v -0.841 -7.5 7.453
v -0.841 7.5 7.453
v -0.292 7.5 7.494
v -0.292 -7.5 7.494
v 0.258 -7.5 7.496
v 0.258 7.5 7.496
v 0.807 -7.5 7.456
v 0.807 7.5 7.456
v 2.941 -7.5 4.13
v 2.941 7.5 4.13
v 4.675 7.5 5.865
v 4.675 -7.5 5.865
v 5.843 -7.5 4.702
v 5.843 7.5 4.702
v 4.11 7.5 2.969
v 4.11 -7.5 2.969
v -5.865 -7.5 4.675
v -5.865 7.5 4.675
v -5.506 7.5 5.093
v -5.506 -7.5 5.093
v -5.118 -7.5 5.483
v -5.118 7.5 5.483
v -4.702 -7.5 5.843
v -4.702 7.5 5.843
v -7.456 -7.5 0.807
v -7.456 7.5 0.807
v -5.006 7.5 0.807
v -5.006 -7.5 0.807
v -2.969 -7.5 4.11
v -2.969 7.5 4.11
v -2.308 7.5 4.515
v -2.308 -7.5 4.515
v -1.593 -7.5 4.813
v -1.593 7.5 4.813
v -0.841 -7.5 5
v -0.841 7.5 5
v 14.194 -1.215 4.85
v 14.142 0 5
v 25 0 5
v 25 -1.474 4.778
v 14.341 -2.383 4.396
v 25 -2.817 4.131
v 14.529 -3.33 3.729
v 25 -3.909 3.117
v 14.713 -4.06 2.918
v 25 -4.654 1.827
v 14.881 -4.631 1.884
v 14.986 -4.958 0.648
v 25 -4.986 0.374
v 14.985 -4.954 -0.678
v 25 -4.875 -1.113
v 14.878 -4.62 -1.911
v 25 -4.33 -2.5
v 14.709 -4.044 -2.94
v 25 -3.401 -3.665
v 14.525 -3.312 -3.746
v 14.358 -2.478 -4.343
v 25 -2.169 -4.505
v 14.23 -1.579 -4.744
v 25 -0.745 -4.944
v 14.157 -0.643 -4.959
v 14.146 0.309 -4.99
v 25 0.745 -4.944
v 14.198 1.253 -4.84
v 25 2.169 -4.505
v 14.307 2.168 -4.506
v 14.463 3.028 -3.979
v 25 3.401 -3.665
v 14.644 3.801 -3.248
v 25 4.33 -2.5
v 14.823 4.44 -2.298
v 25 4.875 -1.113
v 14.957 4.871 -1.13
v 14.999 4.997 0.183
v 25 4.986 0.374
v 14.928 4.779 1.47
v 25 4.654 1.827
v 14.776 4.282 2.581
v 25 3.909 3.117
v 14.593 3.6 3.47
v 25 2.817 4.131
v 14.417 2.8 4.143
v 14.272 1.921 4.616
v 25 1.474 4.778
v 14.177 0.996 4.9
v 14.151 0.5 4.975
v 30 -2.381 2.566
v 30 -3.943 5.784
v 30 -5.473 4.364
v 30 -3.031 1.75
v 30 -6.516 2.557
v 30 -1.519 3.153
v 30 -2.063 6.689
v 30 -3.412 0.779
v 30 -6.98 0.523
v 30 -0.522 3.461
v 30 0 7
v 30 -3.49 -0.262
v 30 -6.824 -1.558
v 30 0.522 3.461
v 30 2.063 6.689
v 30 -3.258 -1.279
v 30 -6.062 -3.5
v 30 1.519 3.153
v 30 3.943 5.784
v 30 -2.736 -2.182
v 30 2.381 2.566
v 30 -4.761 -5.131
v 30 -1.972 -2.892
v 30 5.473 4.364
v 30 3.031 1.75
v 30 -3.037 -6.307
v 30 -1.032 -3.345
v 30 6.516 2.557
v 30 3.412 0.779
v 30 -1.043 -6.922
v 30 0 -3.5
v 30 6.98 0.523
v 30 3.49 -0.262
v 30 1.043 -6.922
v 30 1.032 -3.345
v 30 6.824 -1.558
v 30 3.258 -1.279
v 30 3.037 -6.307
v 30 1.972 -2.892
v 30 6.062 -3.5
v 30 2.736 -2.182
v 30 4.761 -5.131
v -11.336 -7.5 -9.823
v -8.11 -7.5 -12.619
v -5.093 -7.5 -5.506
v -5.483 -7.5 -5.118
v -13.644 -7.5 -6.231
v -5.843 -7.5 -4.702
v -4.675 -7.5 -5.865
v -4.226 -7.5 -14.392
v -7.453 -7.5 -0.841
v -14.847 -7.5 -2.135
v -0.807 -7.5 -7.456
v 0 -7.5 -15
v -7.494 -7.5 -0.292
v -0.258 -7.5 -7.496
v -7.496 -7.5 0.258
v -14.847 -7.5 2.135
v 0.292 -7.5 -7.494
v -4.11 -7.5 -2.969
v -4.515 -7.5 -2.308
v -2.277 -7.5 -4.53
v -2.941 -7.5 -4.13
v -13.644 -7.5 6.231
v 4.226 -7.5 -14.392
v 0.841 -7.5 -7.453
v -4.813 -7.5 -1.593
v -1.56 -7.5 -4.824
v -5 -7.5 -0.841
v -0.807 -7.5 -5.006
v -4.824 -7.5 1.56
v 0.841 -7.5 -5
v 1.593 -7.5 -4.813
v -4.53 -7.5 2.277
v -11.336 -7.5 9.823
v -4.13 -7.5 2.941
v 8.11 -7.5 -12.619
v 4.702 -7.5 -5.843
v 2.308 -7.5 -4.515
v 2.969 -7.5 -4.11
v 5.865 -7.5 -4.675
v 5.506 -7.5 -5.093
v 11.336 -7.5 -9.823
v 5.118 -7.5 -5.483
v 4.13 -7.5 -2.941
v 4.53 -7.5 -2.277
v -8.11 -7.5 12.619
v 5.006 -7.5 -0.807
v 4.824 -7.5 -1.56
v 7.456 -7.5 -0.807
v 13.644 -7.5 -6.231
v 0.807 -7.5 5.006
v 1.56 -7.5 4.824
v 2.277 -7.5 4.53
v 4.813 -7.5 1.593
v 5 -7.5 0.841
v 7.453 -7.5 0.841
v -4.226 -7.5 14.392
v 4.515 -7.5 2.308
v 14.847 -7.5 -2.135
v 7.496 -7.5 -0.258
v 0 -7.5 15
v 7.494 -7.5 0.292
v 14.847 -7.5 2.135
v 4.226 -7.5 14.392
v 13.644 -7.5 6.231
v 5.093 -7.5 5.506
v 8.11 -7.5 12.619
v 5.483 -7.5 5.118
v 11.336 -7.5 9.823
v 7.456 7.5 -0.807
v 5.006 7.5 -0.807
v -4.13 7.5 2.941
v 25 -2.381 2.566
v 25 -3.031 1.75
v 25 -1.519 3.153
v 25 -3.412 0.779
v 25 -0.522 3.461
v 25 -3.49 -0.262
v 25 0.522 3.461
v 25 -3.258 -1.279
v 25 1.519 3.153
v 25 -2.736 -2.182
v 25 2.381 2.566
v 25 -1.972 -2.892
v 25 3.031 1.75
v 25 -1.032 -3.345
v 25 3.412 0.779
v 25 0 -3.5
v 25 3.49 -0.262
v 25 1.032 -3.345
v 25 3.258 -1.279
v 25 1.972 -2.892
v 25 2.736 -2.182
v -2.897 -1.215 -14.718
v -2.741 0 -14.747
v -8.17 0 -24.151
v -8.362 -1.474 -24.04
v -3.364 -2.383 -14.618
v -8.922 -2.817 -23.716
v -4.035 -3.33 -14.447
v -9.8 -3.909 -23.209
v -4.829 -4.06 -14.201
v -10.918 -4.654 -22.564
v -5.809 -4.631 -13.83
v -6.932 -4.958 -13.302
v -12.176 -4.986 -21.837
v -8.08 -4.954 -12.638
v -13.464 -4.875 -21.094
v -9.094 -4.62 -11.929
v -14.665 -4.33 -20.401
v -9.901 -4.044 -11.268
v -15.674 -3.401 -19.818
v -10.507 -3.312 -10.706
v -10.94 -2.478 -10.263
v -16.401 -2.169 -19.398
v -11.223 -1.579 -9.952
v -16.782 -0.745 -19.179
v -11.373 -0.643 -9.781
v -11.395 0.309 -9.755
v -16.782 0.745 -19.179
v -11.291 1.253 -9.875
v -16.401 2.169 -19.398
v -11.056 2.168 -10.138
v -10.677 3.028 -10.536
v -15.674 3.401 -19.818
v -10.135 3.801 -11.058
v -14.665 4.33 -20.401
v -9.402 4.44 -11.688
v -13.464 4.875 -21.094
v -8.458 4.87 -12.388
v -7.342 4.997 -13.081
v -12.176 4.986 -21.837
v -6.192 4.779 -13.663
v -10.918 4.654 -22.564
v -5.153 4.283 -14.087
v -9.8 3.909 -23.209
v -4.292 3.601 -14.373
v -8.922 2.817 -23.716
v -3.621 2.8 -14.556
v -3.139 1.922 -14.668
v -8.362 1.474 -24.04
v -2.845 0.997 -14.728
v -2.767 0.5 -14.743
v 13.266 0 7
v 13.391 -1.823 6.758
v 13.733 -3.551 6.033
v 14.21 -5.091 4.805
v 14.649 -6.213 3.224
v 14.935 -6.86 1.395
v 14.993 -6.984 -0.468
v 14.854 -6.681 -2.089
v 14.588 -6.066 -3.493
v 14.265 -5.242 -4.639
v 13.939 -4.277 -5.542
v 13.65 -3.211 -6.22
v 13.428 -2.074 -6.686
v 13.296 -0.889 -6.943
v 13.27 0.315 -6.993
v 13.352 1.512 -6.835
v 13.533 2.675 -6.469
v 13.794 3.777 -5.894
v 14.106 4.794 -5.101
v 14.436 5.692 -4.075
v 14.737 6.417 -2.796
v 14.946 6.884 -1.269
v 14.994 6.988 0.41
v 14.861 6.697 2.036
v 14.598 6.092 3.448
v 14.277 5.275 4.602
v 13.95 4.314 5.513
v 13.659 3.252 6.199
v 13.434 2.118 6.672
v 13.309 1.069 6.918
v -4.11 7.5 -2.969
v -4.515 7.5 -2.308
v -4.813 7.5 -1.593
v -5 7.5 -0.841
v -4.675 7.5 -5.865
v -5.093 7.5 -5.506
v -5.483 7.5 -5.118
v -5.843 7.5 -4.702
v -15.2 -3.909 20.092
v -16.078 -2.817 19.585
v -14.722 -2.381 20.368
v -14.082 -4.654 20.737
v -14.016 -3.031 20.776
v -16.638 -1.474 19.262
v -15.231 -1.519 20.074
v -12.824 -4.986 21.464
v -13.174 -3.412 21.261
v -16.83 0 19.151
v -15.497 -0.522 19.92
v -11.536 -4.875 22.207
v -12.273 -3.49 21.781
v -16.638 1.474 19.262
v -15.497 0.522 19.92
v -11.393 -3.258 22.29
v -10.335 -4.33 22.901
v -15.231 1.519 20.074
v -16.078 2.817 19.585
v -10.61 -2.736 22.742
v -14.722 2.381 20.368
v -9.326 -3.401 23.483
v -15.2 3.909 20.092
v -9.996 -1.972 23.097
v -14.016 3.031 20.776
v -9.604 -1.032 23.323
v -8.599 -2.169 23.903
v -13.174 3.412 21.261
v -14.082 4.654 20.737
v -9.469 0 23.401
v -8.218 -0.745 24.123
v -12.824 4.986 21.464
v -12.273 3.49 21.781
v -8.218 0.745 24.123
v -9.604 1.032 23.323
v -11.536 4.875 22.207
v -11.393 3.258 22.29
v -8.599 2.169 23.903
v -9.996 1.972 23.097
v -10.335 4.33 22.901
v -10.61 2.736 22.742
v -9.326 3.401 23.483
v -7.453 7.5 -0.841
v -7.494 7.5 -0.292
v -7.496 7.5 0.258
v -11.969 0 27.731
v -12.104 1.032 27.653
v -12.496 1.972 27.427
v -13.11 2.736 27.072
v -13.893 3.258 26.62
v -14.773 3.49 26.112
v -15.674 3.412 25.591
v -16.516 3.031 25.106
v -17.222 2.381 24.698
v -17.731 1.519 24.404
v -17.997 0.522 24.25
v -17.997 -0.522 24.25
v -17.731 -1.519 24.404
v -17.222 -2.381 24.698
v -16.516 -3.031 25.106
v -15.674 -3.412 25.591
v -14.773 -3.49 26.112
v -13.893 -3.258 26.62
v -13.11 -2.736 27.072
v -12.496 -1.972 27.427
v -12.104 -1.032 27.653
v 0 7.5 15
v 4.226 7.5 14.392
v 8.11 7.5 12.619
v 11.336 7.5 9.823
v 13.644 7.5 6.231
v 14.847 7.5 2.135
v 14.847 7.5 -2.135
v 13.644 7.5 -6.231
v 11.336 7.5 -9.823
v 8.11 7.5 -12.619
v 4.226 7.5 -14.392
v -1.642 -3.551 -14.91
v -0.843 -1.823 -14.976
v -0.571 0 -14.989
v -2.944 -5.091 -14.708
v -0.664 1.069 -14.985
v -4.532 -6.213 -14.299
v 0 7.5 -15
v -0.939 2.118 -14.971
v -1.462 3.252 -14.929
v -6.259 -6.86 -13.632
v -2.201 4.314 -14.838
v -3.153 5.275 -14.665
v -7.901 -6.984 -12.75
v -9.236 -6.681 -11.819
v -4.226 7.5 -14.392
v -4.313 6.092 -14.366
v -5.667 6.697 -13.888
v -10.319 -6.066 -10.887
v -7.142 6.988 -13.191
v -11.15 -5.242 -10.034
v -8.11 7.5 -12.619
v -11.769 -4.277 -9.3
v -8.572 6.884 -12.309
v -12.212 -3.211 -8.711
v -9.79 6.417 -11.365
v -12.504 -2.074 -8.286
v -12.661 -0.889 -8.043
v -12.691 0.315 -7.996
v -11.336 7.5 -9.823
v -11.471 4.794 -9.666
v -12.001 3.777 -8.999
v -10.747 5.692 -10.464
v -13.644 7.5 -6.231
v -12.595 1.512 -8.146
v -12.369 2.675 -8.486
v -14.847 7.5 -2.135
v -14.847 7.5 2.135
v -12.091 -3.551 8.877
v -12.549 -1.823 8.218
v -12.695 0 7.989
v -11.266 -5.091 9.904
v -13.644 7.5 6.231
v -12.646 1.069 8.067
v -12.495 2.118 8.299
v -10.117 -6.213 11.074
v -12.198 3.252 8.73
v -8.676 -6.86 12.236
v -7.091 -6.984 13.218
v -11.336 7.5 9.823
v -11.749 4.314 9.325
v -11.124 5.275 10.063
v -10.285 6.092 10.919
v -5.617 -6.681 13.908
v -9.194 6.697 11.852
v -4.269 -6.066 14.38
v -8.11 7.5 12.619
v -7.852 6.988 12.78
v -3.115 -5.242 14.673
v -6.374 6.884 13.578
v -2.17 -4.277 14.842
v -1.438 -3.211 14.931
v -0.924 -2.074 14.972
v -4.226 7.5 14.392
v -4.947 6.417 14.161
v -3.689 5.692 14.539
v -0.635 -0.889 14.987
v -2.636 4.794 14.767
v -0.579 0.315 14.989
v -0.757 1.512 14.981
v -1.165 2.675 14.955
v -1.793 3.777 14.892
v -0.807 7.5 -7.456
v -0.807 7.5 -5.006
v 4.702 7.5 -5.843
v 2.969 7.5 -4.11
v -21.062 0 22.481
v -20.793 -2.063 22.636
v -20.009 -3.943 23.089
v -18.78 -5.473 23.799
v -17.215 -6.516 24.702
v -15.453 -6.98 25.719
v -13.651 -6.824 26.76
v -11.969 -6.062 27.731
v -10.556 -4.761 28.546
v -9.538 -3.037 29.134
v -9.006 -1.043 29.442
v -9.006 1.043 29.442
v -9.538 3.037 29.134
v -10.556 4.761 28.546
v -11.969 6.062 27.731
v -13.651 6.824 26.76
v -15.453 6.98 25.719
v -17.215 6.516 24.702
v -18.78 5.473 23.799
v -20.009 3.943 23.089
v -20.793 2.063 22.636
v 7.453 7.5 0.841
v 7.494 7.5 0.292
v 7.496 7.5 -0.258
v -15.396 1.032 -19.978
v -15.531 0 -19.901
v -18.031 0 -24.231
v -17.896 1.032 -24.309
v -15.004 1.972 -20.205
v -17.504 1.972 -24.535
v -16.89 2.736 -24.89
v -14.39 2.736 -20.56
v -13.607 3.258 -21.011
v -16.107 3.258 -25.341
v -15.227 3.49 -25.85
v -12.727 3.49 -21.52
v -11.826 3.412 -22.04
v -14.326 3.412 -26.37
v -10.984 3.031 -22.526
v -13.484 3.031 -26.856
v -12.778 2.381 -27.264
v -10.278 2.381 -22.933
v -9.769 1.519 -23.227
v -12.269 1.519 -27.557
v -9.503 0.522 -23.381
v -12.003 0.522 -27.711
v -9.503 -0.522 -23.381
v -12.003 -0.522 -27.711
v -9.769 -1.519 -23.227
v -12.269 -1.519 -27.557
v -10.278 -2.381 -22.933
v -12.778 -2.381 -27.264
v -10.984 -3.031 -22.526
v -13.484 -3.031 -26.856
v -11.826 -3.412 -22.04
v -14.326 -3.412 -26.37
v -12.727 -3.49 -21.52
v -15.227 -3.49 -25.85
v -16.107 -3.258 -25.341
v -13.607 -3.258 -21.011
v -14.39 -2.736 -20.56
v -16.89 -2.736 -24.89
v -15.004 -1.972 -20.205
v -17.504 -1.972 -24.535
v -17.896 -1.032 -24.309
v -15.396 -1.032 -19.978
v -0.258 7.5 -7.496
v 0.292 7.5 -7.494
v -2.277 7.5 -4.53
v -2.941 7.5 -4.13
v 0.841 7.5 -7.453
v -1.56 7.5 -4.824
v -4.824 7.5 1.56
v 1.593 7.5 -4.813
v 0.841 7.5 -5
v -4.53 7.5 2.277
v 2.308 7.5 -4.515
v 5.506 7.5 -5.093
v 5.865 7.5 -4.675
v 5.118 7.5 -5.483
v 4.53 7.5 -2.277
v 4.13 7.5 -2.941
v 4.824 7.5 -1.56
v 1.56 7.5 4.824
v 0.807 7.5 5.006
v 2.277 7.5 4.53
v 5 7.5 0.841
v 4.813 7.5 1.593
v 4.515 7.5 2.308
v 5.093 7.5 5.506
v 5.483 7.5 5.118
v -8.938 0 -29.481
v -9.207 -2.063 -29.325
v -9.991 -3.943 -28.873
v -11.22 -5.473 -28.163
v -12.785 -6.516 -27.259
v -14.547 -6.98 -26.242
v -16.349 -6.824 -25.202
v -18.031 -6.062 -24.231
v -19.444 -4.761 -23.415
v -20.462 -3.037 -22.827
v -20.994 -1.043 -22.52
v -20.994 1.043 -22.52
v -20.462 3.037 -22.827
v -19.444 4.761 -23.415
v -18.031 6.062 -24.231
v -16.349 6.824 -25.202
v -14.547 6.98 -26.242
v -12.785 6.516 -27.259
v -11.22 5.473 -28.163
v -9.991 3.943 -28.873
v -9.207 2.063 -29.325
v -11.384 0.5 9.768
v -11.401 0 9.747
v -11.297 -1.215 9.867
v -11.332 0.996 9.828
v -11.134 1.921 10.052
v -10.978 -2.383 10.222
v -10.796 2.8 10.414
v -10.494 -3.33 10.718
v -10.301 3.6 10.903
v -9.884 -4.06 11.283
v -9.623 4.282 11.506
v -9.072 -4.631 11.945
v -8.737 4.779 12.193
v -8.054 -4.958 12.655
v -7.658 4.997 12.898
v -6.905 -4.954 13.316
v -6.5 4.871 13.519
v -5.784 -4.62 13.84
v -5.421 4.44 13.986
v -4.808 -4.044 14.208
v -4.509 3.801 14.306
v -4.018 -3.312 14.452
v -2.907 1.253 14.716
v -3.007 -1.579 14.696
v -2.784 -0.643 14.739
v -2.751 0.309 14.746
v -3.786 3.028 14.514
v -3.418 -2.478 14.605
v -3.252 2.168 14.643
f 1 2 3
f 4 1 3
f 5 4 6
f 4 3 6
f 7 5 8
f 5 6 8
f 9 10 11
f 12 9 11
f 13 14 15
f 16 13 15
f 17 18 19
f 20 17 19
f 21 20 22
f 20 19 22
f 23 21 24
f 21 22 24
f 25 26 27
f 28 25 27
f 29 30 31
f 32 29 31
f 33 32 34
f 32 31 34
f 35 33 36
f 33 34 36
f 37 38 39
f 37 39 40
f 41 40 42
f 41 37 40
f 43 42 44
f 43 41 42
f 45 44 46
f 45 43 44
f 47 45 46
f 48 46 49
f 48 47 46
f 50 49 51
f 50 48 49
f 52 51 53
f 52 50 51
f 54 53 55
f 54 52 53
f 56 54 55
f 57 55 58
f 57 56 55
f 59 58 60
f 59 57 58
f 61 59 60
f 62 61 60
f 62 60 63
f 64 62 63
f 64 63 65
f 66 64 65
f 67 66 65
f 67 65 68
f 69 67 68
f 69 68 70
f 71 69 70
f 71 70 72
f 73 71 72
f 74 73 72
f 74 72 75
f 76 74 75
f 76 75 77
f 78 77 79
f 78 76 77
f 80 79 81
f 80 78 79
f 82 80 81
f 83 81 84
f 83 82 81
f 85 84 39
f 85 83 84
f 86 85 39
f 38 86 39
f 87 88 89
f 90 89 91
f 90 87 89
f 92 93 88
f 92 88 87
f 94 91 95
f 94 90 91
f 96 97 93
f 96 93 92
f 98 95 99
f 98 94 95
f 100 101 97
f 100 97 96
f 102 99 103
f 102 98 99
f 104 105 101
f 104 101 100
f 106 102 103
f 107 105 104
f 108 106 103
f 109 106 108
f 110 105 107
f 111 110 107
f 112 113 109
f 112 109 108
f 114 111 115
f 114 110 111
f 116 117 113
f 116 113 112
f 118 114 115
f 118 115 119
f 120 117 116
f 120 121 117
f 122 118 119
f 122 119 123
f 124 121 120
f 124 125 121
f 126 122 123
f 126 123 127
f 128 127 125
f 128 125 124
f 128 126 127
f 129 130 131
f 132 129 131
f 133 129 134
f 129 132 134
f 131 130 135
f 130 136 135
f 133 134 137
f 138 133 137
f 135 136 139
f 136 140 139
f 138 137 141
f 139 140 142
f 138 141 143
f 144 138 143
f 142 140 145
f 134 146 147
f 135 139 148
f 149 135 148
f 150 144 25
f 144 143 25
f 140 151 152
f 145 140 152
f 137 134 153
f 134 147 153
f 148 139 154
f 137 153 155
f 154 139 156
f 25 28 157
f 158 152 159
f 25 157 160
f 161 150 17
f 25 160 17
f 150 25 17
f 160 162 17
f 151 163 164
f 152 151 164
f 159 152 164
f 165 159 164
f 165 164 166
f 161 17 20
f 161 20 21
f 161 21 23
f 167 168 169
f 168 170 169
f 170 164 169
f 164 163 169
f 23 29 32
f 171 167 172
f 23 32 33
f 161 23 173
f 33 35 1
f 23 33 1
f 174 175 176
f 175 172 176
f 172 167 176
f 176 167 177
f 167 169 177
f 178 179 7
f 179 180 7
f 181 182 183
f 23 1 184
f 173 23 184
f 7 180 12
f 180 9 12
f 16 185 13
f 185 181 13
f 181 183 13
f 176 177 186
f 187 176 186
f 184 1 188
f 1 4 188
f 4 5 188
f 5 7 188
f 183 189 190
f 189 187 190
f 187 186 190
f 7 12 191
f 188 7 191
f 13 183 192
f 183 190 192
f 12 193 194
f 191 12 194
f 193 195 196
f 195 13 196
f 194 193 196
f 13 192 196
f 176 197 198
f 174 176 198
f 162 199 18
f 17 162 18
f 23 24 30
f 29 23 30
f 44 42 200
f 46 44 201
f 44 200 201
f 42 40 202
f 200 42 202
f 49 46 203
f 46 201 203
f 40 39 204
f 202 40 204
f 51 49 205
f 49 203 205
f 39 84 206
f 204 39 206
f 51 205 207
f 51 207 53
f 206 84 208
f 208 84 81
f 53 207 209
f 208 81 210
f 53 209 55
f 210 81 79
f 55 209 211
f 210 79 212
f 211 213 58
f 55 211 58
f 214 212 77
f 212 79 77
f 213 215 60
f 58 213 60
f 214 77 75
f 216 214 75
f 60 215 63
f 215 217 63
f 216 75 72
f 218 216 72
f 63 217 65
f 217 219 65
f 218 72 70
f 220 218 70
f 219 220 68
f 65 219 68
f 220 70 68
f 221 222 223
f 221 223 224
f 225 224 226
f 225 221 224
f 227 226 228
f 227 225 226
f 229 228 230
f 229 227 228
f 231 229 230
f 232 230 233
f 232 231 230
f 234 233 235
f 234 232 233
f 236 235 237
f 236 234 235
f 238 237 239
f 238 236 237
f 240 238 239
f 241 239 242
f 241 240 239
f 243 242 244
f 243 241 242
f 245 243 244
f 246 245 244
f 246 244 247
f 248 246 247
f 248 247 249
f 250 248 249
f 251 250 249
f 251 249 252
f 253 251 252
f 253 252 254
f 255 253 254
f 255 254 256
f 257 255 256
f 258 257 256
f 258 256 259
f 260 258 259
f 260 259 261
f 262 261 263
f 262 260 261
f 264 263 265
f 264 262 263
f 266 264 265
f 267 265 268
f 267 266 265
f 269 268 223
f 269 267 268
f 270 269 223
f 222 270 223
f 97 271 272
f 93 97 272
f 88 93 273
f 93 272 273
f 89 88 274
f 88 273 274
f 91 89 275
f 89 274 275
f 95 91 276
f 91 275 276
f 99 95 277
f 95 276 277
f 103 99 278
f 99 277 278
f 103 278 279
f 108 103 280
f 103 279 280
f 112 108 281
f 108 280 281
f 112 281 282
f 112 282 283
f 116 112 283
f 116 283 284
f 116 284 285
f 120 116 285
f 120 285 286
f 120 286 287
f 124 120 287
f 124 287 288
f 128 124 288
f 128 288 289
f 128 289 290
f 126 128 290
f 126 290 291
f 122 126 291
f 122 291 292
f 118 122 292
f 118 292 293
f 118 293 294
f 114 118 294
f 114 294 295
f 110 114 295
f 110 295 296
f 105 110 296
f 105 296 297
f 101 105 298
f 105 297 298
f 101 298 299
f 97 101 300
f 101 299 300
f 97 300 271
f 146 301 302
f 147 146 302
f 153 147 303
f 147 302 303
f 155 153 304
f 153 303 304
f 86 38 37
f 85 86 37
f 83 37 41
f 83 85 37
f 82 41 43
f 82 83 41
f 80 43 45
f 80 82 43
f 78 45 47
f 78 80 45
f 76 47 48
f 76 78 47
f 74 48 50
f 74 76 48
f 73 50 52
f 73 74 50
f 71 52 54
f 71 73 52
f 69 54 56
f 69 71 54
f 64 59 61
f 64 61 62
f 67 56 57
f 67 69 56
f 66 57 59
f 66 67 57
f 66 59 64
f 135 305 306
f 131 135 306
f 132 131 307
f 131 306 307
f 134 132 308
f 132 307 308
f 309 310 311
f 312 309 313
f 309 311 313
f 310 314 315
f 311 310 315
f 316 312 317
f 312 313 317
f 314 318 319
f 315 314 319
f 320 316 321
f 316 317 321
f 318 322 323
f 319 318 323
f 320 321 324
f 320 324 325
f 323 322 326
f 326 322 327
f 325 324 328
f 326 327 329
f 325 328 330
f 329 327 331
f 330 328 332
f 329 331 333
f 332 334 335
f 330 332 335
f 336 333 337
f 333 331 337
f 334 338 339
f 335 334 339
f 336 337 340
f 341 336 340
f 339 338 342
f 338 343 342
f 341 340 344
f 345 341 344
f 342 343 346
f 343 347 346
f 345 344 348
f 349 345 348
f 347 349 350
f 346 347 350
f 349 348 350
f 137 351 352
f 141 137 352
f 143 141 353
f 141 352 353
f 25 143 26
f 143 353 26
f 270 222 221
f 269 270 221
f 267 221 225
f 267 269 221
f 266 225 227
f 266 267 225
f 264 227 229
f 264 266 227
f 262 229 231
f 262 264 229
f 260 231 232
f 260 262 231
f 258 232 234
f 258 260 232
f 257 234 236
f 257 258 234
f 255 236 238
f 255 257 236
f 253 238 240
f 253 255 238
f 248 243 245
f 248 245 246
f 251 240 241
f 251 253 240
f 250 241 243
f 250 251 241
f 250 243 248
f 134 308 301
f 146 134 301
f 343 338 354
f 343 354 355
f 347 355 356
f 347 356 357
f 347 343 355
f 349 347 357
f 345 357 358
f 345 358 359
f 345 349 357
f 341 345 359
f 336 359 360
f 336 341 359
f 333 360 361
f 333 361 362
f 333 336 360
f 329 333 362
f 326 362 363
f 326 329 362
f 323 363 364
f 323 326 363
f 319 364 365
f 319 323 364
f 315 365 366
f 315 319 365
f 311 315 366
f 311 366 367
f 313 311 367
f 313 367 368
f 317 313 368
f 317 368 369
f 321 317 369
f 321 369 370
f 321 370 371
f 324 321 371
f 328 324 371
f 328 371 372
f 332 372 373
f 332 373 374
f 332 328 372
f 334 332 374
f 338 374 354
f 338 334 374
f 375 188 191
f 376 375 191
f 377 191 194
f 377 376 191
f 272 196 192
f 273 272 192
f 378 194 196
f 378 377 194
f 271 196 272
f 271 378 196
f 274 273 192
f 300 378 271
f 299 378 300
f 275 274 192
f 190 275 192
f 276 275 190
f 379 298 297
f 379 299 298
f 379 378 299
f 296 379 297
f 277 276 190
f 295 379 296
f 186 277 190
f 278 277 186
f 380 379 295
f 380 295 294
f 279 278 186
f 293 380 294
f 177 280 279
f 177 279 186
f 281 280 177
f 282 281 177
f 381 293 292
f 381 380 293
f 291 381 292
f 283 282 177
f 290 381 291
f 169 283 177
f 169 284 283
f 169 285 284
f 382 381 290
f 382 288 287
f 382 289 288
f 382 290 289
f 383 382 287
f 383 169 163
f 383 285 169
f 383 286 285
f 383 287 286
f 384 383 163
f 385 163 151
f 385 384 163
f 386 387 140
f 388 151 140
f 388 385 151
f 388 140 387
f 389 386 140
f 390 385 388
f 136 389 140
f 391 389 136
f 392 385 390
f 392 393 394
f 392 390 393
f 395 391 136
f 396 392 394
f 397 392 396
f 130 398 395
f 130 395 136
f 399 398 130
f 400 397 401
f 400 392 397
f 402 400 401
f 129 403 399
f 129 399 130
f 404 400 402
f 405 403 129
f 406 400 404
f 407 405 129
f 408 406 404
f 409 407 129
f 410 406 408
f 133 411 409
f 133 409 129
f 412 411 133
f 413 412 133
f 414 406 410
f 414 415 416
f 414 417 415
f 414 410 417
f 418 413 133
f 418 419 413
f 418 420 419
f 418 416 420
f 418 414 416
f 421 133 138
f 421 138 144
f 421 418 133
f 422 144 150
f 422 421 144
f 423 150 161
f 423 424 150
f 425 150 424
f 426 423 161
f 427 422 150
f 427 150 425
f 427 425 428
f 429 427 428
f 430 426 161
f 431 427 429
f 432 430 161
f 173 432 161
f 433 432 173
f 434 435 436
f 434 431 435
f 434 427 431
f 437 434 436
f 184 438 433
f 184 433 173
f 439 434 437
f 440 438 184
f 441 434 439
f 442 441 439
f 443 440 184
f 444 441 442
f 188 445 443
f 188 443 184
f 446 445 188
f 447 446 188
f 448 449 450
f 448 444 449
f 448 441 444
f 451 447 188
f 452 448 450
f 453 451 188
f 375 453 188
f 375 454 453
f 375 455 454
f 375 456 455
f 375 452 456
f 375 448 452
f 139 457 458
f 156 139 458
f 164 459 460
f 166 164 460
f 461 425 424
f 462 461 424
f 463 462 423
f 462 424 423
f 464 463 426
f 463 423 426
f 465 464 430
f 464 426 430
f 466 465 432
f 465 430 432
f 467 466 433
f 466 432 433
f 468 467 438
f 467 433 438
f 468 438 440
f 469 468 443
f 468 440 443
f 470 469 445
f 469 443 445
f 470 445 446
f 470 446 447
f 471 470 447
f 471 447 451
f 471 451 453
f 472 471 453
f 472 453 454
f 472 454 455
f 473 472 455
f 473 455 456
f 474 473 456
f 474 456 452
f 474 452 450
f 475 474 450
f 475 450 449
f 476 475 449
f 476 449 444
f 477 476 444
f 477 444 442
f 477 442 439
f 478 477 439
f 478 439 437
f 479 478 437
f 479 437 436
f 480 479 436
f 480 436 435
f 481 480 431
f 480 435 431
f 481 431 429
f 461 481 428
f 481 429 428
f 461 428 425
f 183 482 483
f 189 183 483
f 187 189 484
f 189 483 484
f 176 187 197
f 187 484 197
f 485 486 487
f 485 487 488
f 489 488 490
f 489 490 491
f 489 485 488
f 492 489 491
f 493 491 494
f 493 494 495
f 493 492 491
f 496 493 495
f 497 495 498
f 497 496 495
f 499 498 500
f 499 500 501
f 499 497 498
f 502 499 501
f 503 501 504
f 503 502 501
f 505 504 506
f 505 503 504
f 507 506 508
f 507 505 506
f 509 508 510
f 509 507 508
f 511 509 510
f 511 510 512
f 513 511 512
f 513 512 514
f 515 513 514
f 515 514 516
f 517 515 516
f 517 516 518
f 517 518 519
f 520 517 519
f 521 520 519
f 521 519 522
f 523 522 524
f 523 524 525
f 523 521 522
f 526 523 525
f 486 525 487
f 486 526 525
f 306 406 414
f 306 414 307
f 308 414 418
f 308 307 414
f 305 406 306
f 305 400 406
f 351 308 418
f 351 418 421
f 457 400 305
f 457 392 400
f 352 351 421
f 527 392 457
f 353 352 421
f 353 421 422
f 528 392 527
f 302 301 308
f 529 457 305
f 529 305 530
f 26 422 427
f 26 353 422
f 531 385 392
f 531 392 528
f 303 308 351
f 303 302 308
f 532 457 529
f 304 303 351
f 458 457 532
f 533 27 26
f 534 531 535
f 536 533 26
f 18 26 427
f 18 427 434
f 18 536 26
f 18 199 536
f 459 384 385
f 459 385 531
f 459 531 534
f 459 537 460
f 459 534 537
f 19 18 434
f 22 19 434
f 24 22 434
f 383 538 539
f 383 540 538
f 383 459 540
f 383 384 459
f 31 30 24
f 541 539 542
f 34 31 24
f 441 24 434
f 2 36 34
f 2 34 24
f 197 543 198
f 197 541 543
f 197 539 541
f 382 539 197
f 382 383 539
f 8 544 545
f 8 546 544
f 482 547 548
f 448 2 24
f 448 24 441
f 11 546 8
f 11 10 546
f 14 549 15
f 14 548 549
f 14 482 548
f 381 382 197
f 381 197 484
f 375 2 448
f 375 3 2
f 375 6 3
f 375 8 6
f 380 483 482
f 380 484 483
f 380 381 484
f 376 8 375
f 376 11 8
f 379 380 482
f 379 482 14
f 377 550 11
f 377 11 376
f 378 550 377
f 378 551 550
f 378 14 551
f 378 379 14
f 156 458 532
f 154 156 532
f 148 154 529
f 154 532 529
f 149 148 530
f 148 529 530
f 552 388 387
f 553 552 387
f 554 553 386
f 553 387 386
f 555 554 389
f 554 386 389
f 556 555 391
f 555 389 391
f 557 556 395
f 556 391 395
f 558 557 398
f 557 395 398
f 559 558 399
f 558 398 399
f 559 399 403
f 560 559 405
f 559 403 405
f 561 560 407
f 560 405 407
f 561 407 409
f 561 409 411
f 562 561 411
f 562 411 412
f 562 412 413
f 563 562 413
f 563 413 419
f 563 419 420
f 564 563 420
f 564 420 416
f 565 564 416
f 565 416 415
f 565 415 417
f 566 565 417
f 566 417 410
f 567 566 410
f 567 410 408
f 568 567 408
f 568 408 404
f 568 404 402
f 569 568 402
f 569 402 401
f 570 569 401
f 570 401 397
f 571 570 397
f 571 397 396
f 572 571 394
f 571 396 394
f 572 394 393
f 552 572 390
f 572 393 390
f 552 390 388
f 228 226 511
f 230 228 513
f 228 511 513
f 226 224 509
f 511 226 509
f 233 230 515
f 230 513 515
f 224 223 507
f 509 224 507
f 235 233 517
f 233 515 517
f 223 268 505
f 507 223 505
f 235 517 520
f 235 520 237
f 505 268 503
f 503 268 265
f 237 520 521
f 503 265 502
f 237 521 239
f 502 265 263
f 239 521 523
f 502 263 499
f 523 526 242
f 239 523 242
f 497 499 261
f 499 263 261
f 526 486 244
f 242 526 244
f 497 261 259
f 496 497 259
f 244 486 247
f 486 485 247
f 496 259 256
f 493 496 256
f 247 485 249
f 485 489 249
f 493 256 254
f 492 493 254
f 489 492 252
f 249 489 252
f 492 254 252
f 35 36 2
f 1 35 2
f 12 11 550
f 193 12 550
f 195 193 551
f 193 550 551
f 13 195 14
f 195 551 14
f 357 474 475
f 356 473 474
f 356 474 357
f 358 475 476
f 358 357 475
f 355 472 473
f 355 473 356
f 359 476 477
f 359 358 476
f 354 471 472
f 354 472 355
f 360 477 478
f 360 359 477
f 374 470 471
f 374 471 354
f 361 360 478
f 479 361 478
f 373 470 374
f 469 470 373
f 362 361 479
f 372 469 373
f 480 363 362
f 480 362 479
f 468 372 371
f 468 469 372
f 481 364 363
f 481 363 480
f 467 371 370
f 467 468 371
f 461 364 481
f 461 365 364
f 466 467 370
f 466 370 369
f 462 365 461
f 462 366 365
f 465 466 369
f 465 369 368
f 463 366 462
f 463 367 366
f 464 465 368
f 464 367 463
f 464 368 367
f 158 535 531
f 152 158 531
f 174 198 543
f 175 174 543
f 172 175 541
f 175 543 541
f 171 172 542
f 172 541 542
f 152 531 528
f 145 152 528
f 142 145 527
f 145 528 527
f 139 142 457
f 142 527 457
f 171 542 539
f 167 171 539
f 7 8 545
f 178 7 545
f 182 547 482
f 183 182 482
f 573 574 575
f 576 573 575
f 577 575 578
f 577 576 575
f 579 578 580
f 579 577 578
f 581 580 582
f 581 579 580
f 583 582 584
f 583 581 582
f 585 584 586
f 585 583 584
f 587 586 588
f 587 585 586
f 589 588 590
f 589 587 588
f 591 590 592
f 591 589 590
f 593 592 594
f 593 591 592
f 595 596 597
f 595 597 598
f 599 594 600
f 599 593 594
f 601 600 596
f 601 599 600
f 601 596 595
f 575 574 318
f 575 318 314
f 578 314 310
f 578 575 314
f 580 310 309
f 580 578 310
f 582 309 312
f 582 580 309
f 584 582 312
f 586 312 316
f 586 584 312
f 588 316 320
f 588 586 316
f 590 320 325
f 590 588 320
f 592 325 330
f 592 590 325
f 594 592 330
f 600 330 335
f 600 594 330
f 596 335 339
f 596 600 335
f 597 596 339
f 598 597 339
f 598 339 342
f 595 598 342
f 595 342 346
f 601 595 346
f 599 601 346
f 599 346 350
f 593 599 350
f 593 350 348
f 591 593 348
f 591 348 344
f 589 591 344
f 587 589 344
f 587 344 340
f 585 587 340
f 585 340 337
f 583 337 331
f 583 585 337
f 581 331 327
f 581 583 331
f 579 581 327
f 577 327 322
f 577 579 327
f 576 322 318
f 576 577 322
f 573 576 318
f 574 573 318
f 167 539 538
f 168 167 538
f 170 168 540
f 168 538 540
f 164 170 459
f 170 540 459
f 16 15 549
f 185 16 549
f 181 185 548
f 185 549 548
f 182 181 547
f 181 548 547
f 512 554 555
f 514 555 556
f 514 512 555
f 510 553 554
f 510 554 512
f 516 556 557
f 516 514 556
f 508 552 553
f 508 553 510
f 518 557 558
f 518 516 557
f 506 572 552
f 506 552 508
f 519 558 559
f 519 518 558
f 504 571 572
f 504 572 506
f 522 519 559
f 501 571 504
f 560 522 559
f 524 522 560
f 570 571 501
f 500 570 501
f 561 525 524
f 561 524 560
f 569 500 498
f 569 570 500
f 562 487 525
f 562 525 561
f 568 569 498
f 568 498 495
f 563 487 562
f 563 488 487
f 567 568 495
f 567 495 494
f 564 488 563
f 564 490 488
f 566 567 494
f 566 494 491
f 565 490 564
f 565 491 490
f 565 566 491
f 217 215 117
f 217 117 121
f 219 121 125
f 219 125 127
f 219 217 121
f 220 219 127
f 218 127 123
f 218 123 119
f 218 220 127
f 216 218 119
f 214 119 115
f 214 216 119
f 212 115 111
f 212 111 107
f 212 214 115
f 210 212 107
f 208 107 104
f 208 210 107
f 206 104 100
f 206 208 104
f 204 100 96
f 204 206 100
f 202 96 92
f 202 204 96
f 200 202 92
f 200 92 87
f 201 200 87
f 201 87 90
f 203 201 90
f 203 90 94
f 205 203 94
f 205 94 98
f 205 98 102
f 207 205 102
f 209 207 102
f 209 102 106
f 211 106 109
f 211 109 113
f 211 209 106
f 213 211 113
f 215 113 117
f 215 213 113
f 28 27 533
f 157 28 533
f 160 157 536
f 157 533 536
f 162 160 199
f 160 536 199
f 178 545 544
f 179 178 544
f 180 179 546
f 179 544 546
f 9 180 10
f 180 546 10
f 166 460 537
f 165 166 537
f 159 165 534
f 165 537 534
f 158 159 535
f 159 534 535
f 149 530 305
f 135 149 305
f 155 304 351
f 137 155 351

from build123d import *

# Parameters (mm, degrees)
SKETCH1_R                 = 15
BOSS_EXTRUDE1_DEPTH       = 7.5
BOSS_EXTRUDE2_START       = 13
SKETCH3_R                 = 7
SKETCH3_R_2               = 5
BOSS_EXTRUDE2_DEPTH       = 17
SKETCH3_4_R               = 3.5
SKETCH3_4_R_2             = 5
BOSS_EXTRUDE3_DEPTH       = 14
BOSS_EXTRUDE4_START       = 25
BOSS_EXTRUDE4_OUTLINE_R   = 5
BOSS_EXTRUDE4_OUTLINE_R_2 = 3.5
BOSS_EXTRUDE4_DEPTH       = 5
CIRPATTERN14_COUNT        = 3
CUT_EXTRUDE5_DEPTH        = 45.655518692


# Read off the part's stored shape, not the designer's step: Boss-Extrude4
with BuildPart() as part:
    # Sketch1 → Boss-Extrude1 (new, symmetric)
    with BuildSketch(Plane(origin=(0, 0, 0), x_dir=(1, 0, 0), z_dir=(0, 1, 0))):
        with Locations(Location((0, 0, 0), (0, 0, 270))):
            Circle(SKETCH1_R)
    extrude(amount=BOSS_EXTRUDE1_DEPTH, both=True)

    # Sketch3 → Boss-Extrude2 (add)
    with BuildSketch(Plane(origin=(0, 0, 0), x_dir=(0, 0, -1), z_dir=(1, 0, 0)).offset(BOSS_EXTRUDE2_START)):
        with Locations(Location((0, 0, 0), (0, 0, 180))):
            Circle(SKETCH3_R)
        with Locations(Location((0, 0, 0), (0, 0, 180))):
            Circle(SKETCH3_R_2, mode=Mode.SUBTRACT)
    boss_extrude2 = extrude(amount=BOSS_EXTRUDE2_DEPTH)

    # Sketch3<4> → Boss-Extrude3 (add)
    with BuildSketch(Plane(origin=(0, 0, 0), x_dir=(0, 0, -1), z_dir=(1, 0, 0))):
        Circle(SKETCH3_4_R)
        with Locations(Location((0, 0, 0), (0, 0, 180))):
            Circle(SKETCH3_4_R_2)
    boss_extrude3 = extrude(amount=BOSS_EXTRUDE3_DEPTH)

    # Boss-Extrude4 outline → Boss-Extrude4 (add)
    with BuildSketch(Plane(origin=(0, 0, 0), x_dir=(0, 0, -1), z_dir=(1, 0, 0)).offset(BOSS_EXTRUDE4_START)):
        Circle(BOSS_EXTRUDE4_OUTLINE_R)
        Circle(BOSS_EXTRUDE4_OUTLINE_R_2, mode=Mode.SUBTRACT)
    boss_extrude4 = extrude(amount=BOSS_EXTRUDE4_DEPTH)

    # CirPattern14: Boss-Extrude2, Boss-Extrude3, Boss-Extrude4 ×3 about axis
    cirpattern14_axis = Axis((0, -7.5, 0), (0, 1, 0))
    add([boss_extrude2.rotate(cirpattern14_axis, i * 360 / CIRPATTERN14_COUNT) for i in range(1, CIRPATTERN14_COUNT)])
    add([boss_extrude3.rotate(cirpattern14_axis, i * 360 / CIRPATTERN14_COUNT) for i in range(1, CIRPATTERN14_COUNT)])
    add([boss_extrude4.rotate(cirpattern14_axis, i * 360 / CIRPATTERN14_COUNT) for i in range(1, CIRPATTERN14_COUNT)])

    # Sketch4 → Cut-Extrude5 (cut, through all)
    with BuildSketch(Plane(origin=(0, 7.5, 0), x_dir=(1, 0, 0), z_dir=(0, 1, 0))):
        with BuildLine():
            ThreePointArc((5.864590062, 4.675102502), (5.315335108, 5.29123924), (4.701700296, 5.843287972))
            Line((4.701700296, 5.843287972), (2.968685581, 4.110273257))
            ThreePointArc((2.968685581, 4.110273257), (1.956146698, 4.677705679), (0.84109472, 5))
            Line((0.84109472, 5), (0.84109472, 7.452688084))
            ThreePointArc((0.84109472, 7.452688084), (0.017038352, 7.499980646), (-0.807224387, 7.456432712))
            Line((-0.807224387, 7.456432712), (-0.807224387, 5.005579798))
            ThreePointArc((-0.807224387, 5.005579798), (-1.924432811, 4.690842002), (-2.940790126, 4.130277686))
            Line((-2.940790126, 4.130277686), (-4.675102502, 5.864590062))
            ThreePointArc((-4.675102502, 5.864590062), (-5.29123924, 5.315335108), (-5.843287972, 4.701700296))
            Line((-5.843287972, 4.701700296), (-4.110273257, 2.968685581))
            ThreePointArc((-4.110273257, 2.968685581), (-4.677705679, 1.956146698), (-5, 0.84109472))
            Line((-5, 0.84109472), (-7.452688084, 0.84109472))
            ThreePointArc((-7.452688084, 0.84109472), (-7.499980646, 0.017038352), (-7.456432712, -0.807224387))
            Line((-7.456432712, -0.807224387), (-5.005579798, -0.807224387))
            ThreePointArc((-5.005579798, -0.807224387), (-4.690842002, -1.924432811), (-4.130277686, -2.940790126))
            Line((-4.130277686, -2.940790126), (-5.864590062, -4.675102502))
            ThreePointArc((-5.864590062, -4.675102502), (-5.315335108, -5.29123924), (-4.701700296, -5.843287972))
            Line((-4.701700296, -5.843287972), (-2.968685581, -4.110273257))
            ThreePointArc((-2.968685581, -4.110273257), (-1.956146698, -4.677705679), (-0.84109472, -5))
            Line((-0.84109472, -5), (-0.84109472, -7.452688084))
            ThreePointArc((-0.84109472, -7.452688084), (-0.017038352, -7.499980646), (0.807224387, -7.456432712))
            Line((0.807224387, -7.456432712), (0.807224387, -5.005579798))
            ThreePointArc((0.807224387, -5.005579798), (1.924432811, -4.690842002), (2.940790126, -4.130277686))
            Line((2.940790126, -4.130277686), (4.675102502, -5.864590062))
            ThreePointArc((4.675102502, -5.864590062), (5.29123924, -5.315335108), (5.843287972, -4.701700296))
            Line((5.843287972, -4.701700296), (4.110273257, -2.968685581))
            ThreePointArc((4.110273257, -2.968685581), (4.677705679, -1.956146698), (5, -0.84109472))
            Line((5, -0.84109472), (7.452688084, -0.84109472))
            ThreePointArc((7.452688084, -0.84109472), (7.499980646, -0.017038352), (7.456432712, 0.807224387))
            Line((7.456432712, 0.807224387), (5.005579798, 0.807224387))
            ThreePointArc((5.005579798, 0.807224387), (4.690842002, 1.924432811), (4.130277686, 2.940790126))
            Line((4.130277686, 2.940790126), (5.864590062, 4.675102502))
        make_face()
    extrude(amount=-CUT_EXTRUDE5_DEPTH, mode=Mode.SUBTRACT)


solid = part.part
